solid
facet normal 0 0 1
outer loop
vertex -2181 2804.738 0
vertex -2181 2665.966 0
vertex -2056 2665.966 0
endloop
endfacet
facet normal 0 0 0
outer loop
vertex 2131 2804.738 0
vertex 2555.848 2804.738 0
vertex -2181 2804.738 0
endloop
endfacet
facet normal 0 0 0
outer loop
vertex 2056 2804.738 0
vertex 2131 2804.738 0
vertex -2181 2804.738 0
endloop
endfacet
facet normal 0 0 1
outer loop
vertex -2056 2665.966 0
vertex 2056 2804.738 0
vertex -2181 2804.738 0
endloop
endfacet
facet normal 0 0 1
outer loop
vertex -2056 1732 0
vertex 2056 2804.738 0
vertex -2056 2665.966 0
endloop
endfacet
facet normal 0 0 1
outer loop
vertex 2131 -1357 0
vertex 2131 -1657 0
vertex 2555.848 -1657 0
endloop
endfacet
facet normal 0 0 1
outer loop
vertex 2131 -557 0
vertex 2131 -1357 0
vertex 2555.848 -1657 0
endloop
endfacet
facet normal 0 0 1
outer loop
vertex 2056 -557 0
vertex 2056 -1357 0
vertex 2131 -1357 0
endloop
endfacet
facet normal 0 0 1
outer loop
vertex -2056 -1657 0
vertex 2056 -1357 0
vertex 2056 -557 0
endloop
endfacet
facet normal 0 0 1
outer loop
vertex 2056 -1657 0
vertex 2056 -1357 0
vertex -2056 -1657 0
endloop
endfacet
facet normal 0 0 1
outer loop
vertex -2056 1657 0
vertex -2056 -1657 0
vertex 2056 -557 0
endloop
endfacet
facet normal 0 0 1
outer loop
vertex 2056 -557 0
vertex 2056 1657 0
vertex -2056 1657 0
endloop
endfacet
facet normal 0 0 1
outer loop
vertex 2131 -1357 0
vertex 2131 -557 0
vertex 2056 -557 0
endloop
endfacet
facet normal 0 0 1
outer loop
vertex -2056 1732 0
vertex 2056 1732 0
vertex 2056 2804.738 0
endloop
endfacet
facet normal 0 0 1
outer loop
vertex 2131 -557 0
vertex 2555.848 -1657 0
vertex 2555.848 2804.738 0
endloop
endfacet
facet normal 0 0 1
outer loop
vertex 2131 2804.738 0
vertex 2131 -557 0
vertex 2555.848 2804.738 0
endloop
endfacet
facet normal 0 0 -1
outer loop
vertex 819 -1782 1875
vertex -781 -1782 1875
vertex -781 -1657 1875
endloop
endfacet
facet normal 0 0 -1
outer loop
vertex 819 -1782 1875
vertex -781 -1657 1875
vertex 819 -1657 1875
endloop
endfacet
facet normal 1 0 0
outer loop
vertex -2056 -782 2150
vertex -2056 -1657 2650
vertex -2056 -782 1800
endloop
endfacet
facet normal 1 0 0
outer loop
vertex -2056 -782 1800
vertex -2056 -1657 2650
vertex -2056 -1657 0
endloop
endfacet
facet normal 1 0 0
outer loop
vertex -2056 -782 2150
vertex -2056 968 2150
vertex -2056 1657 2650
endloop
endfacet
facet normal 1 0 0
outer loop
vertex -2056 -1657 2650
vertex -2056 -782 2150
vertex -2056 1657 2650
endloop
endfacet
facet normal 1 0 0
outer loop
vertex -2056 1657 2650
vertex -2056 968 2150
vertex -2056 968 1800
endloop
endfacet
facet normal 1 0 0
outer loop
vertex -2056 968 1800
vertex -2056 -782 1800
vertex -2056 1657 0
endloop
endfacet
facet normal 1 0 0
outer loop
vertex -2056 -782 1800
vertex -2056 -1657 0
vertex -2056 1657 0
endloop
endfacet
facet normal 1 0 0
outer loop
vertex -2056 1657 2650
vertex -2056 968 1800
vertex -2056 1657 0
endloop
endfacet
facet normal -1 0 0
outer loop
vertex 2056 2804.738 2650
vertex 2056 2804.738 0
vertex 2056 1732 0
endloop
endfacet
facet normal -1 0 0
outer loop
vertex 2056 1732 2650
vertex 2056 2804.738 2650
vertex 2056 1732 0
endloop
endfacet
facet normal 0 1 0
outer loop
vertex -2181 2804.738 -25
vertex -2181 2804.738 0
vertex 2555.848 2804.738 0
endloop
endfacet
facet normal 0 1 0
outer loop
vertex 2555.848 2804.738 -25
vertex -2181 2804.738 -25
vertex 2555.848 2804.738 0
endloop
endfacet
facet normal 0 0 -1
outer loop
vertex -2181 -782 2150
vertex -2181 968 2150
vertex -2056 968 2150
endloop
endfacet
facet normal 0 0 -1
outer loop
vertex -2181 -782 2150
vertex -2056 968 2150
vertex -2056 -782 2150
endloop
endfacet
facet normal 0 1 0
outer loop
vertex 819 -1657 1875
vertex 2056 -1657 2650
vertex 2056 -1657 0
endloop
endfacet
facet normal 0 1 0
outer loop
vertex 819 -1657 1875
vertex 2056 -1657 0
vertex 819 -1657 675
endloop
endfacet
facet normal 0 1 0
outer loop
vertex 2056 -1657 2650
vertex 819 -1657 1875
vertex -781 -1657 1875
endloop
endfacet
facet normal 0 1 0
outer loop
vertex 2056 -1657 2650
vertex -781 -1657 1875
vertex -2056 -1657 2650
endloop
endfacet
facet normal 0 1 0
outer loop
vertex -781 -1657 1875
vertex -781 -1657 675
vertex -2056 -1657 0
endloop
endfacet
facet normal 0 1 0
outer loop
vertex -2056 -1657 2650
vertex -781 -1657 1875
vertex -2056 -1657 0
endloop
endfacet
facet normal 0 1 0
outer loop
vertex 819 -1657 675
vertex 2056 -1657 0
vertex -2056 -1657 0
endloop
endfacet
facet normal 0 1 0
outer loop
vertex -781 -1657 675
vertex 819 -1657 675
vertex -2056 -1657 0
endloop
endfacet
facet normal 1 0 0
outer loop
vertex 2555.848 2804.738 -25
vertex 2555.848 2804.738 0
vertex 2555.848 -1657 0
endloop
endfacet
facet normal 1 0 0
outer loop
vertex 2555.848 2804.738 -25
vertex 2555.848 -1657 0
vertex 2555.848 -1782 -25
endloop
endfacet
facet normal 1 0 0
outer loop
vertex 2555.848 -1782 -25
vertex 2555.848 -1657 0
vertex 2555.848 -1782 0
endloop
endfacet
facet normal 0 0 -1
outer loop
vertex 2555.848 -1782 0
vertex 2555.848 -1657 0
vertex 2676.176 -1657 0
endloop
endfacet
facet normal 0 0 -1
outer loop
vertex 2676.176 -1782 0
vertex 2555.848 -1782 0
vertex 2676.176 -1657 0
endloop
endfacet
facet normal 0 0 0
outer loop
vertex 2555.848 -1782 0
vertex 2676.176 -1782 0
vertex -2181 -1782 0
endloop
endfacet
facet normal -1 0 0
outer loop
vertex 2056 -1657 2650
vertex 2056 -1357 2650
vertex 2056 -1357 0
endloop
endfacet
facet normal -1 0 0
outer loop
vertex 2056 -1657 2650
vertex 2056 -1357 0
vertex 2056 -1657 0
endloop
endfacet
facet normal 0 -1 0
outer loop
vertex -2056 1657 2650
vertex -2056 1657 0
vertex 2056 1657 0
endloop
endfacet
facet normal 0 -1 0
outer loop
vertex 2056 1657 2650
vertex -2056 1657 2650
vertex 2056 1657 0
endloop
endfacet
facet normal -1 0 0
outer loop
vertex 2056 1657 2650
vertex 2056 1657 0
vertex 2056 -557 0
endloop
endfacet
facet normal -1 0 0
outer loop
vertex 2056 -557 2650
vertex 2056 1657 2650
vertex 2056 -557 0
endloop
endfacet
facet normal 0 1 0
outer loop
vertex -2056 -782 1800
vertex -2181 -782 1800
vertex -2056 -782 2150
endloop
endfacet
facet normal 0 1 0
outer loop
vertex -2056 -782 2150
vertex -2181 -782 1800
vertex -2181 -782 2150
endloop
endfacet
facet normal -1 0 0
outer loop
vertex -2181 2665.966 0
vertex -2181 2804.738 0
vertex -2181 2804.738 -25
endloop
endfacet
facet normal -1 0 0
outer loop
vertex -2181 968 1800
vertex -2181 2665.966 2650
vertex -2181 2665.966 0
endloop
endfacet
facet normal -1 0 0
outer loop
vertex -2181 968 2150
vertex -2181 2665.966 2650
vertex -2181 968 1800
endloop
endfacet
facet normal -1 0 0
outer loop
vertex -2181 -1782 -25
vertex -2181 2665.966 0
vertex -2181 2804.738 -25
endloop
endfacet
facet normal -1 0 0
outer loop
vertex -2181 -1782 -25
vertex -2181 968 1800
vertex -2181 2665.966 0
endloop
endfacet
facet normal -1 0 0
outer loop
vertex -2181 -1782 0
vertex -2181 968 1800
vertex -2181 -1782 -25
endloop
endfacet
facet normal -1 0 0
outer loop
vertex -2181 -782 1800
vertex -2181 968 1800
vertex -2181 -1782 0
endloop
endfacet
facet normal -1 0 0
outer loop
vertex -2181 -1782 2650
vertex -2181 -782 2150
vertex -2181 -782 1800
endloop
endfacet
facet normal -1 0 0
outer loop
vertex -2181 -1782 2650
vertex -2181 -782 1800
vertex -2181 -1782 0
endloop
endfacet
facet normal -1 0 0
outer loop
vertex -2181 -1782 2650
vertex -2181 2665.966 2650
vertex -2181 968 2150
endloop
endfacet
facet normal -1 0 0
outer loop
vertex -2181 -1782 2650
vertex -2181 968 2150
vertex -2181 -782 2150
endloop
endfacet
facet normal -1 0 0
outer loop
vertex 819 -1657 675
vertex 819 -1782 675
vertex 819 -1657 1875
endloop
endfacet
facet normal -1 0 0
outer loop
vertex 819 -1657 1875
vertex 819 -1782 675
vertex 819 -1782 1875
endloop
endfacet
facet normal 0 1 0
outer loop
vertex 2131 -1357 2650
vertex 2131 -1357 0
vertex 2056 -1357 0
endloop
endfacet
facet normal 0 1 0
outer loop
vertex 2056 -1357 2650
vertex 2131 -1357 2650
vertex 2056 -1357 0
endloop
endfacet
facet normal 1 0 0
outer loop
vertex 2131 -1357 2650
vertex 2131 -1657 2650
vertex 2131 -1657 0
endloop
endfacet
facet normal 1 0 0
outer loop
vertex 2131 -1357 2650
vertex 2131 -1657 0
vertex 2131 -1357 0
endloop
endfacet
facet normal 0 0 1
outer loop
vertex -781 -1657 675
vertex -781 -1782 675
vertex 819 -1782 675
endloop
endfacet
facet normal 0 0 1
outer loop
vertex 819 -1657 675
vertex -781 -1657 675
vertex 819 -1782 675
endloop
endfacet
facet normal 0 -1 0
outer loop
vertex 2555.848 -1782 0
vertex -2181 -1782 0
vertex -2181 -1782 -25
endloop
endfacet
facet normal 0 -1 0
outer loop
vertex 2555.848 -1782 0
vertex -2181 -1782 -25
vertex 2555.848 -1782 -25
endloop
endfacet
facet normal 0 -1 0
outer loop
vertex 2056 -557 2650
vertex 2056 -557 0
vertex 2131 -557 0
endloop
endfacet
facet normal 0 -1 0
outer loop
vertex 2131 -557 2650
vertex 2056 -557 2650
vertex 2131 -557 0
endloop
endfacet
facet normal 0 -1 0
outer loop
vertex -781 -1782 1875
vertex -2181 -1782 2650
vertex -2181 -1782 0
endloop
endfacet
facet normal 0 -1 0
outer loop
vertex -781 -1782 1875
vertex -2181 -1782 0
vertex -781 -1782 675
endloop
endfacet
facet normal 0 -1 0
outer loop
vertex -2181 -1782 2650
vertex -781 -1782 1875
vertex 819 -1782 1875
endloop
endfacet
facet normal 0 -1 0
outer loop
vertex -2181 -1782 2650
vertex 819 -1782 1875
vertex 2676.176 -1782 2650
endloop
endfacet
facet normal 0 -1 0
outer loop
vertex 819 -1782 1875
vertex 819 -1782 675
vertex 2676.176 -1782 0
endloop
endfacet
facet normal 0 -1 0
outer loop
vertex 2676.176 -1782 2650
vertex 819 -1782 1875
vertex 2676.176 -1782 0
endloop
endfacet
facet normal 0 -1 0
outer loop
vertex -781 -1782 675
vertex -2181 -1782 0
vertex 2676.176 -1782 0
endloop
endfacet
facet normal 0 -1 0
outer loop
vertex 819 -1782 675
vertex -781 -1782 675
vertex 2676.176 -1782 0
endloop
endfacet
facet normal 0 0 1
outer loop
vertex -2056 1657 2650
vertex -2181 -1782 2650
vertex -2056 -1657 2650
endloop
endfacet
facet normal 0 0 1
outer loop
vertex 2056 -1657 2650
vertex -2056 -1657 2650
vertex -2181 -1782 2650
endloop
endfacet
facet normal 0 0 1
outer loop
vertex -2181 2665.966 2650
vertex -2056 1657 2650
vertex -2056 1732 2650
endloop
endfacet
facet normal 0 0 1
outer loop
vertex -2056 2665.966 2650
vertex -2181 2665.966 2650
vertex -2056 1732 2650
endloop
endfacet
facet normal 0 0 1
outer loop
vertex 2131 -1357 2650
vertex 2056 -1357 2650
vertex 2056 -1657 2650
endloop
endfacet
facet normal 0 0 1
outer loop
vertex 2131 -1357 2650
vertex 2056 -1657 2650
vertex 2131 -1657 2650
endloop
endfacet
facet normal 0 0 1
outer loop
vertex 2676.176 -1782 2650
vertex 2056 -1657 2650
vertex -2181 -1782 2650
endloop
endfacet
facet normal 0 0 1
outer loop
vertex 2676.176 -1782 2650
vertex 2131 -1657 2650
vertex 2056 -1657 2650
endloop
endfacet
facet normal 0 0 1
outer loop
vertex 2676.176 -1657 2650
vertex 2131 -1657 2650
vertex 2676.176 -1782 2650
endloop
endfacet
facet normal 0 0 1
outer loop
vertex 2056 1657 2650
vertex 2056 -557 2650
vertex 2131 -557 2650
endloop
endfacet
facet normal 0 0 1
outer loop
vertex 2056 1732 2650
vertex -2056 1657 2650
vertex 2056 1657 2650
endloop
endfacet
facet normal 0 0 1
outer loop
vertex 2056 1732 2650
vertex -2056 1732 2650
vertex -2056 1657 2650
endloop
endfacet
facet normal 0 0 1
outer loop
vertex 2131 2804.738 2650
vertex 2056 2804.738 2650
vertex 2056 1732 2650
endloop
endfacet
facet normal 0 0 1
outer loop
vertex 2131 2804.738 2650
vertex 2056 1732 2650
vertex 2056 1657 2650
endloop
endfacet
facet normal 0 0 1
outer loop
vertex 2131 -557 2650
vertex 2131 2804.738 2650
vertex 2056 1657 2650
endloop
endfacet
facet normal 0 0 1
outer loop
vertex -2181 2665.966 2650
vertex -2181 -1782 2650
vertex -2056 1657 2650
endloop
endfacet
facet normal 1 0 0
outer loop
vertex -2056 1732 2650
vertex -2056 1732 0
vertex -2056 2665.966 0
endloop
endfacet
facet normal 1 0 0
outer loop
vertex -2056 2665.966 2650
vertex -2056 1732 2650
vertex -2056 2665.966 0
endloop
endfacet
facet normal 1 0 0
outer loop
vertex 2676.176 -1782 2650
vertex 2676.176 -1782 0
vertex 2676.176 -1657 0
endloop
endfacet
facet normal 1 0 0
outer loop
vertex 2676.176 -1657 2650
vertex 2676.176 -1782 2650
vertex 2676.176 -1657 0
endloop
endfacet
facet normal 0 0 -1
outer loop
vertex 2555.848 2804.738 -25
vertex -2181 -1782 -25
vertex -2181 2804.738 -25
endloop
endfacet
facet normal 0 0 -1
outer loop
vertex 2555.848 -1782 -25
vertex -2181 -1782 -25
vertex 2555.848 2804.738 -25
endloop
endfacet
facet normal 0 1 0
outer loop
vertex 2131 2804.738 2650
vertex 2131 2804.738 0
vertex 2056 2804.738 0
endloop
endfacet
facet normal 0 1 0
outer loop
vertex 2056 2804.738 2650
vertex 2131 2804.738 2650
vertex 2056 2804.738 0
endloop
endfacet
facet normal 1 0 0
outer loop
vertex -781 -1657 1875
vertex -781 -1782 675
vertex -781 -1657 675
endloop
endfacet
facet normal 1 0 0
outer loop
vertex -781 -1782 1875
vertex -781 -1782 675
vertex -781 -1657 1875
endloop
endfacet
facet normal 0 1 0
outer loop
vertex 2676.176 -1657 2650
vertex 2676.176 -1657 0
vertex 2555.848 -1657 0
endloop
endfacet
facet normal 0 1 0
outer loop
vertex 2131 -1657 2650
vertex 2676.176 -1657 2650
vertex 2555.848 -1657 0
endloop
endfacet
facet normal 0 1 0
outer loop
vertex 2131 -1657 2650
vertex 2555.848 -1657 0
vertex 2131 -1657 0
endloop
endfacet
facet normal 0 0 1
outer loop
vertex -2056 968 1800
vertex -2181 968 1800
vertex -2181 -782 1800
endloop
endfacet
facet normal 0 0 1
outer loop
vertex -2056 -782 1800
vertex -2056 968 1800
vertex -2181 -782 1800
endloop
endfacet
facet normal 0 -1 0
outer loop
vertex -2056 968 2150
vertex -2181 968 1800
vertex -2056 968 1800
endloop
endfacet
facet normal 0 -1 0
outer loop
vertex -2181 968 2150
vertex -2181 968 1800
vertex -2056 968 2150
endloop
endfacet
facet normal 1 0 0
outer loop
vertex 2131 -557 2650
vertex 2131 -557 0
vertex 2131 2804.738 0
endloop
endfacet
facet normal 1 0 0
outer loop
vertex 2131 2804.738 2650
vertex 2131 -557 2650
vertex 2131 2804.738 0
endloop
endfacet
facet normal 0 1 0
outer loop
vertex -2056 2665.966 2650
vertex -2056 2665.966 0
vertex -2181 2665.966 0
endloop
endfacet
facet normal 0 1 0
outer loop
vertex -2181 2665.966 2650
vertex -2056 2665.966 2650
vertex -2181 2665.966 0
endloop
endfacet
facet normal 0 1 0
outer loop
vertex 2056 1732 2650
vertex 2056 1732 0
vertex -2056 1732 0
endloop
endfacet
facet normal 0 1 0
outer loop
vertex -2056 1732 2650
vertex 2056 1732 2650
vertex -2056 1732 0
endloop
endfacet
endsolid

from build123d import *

# Parameters (mm, degrees)
F1_DEPTH = 2650
F2_W     = 4736.848122
F2_H     = 4586.738045
F3_DEPTH = 25
F4_W     = 1600
F4_H     = 1200
F5_DEPTH = 125
F6_W     = 1750
F6_H     = 350
F7_DEPTH = 125


with BuildPart() as f1:
    # F0 (on Top) → F1 (new body)
    with BuildSketch(Plane.XY):
        Polygon((2056, -1357), (2056, -1657), (-2056, -1657), (-2056, 1657), (2056, 1657), (2056, -557), (2131, -557), (2131, 2804.738045), (2056, 2804.738045), (2056, 1732), (-2056, 1732), (-2056, 2665.965796), (-2181, 2665.965796), (-2181, -1657), (-2181, -1782), (2676.175833, -1782), (2676.175833, -1657), (2131, -1657), (2131, -1357), align=None)
    extrude(amount=F1_DEPTH)

    # F2 (on face) → F3 (join)
    with BuildSketch(Plane(origin=(0, 0, 0), x_dir=(1, 0, 0), z_dir=(0, 0, -1))):
        with Locations((187.424061, -511.369023)):
            Rectangle(F2_W, F2_H)
    extrude(amount=F3_DEPTH)

    # F4 (on face) → F5 (cut, through all)
    with BuildSketch(Plane.XZ.offset(1782)):
        with Locations((19, 1275)):
            Rectangle(F4_W, F4_H)
    extrude(amount=-F5_DEPTH, mode=Mode.SUBTRACT)

    # F6 (on face) → F7 (cut, through all)
    with BuildSketch(Plane(origin=(-2181, 0, 0), x_dir=(0, -1, 0), z_dir=(-1, 0, 0))):
        with Locations((-93, 1975)):
            Rectangle(F6_W, F6_H)
    extrude(amount=-F7_DEPTH, mode=Mode.SUBTRACT)


solid = f1.part
